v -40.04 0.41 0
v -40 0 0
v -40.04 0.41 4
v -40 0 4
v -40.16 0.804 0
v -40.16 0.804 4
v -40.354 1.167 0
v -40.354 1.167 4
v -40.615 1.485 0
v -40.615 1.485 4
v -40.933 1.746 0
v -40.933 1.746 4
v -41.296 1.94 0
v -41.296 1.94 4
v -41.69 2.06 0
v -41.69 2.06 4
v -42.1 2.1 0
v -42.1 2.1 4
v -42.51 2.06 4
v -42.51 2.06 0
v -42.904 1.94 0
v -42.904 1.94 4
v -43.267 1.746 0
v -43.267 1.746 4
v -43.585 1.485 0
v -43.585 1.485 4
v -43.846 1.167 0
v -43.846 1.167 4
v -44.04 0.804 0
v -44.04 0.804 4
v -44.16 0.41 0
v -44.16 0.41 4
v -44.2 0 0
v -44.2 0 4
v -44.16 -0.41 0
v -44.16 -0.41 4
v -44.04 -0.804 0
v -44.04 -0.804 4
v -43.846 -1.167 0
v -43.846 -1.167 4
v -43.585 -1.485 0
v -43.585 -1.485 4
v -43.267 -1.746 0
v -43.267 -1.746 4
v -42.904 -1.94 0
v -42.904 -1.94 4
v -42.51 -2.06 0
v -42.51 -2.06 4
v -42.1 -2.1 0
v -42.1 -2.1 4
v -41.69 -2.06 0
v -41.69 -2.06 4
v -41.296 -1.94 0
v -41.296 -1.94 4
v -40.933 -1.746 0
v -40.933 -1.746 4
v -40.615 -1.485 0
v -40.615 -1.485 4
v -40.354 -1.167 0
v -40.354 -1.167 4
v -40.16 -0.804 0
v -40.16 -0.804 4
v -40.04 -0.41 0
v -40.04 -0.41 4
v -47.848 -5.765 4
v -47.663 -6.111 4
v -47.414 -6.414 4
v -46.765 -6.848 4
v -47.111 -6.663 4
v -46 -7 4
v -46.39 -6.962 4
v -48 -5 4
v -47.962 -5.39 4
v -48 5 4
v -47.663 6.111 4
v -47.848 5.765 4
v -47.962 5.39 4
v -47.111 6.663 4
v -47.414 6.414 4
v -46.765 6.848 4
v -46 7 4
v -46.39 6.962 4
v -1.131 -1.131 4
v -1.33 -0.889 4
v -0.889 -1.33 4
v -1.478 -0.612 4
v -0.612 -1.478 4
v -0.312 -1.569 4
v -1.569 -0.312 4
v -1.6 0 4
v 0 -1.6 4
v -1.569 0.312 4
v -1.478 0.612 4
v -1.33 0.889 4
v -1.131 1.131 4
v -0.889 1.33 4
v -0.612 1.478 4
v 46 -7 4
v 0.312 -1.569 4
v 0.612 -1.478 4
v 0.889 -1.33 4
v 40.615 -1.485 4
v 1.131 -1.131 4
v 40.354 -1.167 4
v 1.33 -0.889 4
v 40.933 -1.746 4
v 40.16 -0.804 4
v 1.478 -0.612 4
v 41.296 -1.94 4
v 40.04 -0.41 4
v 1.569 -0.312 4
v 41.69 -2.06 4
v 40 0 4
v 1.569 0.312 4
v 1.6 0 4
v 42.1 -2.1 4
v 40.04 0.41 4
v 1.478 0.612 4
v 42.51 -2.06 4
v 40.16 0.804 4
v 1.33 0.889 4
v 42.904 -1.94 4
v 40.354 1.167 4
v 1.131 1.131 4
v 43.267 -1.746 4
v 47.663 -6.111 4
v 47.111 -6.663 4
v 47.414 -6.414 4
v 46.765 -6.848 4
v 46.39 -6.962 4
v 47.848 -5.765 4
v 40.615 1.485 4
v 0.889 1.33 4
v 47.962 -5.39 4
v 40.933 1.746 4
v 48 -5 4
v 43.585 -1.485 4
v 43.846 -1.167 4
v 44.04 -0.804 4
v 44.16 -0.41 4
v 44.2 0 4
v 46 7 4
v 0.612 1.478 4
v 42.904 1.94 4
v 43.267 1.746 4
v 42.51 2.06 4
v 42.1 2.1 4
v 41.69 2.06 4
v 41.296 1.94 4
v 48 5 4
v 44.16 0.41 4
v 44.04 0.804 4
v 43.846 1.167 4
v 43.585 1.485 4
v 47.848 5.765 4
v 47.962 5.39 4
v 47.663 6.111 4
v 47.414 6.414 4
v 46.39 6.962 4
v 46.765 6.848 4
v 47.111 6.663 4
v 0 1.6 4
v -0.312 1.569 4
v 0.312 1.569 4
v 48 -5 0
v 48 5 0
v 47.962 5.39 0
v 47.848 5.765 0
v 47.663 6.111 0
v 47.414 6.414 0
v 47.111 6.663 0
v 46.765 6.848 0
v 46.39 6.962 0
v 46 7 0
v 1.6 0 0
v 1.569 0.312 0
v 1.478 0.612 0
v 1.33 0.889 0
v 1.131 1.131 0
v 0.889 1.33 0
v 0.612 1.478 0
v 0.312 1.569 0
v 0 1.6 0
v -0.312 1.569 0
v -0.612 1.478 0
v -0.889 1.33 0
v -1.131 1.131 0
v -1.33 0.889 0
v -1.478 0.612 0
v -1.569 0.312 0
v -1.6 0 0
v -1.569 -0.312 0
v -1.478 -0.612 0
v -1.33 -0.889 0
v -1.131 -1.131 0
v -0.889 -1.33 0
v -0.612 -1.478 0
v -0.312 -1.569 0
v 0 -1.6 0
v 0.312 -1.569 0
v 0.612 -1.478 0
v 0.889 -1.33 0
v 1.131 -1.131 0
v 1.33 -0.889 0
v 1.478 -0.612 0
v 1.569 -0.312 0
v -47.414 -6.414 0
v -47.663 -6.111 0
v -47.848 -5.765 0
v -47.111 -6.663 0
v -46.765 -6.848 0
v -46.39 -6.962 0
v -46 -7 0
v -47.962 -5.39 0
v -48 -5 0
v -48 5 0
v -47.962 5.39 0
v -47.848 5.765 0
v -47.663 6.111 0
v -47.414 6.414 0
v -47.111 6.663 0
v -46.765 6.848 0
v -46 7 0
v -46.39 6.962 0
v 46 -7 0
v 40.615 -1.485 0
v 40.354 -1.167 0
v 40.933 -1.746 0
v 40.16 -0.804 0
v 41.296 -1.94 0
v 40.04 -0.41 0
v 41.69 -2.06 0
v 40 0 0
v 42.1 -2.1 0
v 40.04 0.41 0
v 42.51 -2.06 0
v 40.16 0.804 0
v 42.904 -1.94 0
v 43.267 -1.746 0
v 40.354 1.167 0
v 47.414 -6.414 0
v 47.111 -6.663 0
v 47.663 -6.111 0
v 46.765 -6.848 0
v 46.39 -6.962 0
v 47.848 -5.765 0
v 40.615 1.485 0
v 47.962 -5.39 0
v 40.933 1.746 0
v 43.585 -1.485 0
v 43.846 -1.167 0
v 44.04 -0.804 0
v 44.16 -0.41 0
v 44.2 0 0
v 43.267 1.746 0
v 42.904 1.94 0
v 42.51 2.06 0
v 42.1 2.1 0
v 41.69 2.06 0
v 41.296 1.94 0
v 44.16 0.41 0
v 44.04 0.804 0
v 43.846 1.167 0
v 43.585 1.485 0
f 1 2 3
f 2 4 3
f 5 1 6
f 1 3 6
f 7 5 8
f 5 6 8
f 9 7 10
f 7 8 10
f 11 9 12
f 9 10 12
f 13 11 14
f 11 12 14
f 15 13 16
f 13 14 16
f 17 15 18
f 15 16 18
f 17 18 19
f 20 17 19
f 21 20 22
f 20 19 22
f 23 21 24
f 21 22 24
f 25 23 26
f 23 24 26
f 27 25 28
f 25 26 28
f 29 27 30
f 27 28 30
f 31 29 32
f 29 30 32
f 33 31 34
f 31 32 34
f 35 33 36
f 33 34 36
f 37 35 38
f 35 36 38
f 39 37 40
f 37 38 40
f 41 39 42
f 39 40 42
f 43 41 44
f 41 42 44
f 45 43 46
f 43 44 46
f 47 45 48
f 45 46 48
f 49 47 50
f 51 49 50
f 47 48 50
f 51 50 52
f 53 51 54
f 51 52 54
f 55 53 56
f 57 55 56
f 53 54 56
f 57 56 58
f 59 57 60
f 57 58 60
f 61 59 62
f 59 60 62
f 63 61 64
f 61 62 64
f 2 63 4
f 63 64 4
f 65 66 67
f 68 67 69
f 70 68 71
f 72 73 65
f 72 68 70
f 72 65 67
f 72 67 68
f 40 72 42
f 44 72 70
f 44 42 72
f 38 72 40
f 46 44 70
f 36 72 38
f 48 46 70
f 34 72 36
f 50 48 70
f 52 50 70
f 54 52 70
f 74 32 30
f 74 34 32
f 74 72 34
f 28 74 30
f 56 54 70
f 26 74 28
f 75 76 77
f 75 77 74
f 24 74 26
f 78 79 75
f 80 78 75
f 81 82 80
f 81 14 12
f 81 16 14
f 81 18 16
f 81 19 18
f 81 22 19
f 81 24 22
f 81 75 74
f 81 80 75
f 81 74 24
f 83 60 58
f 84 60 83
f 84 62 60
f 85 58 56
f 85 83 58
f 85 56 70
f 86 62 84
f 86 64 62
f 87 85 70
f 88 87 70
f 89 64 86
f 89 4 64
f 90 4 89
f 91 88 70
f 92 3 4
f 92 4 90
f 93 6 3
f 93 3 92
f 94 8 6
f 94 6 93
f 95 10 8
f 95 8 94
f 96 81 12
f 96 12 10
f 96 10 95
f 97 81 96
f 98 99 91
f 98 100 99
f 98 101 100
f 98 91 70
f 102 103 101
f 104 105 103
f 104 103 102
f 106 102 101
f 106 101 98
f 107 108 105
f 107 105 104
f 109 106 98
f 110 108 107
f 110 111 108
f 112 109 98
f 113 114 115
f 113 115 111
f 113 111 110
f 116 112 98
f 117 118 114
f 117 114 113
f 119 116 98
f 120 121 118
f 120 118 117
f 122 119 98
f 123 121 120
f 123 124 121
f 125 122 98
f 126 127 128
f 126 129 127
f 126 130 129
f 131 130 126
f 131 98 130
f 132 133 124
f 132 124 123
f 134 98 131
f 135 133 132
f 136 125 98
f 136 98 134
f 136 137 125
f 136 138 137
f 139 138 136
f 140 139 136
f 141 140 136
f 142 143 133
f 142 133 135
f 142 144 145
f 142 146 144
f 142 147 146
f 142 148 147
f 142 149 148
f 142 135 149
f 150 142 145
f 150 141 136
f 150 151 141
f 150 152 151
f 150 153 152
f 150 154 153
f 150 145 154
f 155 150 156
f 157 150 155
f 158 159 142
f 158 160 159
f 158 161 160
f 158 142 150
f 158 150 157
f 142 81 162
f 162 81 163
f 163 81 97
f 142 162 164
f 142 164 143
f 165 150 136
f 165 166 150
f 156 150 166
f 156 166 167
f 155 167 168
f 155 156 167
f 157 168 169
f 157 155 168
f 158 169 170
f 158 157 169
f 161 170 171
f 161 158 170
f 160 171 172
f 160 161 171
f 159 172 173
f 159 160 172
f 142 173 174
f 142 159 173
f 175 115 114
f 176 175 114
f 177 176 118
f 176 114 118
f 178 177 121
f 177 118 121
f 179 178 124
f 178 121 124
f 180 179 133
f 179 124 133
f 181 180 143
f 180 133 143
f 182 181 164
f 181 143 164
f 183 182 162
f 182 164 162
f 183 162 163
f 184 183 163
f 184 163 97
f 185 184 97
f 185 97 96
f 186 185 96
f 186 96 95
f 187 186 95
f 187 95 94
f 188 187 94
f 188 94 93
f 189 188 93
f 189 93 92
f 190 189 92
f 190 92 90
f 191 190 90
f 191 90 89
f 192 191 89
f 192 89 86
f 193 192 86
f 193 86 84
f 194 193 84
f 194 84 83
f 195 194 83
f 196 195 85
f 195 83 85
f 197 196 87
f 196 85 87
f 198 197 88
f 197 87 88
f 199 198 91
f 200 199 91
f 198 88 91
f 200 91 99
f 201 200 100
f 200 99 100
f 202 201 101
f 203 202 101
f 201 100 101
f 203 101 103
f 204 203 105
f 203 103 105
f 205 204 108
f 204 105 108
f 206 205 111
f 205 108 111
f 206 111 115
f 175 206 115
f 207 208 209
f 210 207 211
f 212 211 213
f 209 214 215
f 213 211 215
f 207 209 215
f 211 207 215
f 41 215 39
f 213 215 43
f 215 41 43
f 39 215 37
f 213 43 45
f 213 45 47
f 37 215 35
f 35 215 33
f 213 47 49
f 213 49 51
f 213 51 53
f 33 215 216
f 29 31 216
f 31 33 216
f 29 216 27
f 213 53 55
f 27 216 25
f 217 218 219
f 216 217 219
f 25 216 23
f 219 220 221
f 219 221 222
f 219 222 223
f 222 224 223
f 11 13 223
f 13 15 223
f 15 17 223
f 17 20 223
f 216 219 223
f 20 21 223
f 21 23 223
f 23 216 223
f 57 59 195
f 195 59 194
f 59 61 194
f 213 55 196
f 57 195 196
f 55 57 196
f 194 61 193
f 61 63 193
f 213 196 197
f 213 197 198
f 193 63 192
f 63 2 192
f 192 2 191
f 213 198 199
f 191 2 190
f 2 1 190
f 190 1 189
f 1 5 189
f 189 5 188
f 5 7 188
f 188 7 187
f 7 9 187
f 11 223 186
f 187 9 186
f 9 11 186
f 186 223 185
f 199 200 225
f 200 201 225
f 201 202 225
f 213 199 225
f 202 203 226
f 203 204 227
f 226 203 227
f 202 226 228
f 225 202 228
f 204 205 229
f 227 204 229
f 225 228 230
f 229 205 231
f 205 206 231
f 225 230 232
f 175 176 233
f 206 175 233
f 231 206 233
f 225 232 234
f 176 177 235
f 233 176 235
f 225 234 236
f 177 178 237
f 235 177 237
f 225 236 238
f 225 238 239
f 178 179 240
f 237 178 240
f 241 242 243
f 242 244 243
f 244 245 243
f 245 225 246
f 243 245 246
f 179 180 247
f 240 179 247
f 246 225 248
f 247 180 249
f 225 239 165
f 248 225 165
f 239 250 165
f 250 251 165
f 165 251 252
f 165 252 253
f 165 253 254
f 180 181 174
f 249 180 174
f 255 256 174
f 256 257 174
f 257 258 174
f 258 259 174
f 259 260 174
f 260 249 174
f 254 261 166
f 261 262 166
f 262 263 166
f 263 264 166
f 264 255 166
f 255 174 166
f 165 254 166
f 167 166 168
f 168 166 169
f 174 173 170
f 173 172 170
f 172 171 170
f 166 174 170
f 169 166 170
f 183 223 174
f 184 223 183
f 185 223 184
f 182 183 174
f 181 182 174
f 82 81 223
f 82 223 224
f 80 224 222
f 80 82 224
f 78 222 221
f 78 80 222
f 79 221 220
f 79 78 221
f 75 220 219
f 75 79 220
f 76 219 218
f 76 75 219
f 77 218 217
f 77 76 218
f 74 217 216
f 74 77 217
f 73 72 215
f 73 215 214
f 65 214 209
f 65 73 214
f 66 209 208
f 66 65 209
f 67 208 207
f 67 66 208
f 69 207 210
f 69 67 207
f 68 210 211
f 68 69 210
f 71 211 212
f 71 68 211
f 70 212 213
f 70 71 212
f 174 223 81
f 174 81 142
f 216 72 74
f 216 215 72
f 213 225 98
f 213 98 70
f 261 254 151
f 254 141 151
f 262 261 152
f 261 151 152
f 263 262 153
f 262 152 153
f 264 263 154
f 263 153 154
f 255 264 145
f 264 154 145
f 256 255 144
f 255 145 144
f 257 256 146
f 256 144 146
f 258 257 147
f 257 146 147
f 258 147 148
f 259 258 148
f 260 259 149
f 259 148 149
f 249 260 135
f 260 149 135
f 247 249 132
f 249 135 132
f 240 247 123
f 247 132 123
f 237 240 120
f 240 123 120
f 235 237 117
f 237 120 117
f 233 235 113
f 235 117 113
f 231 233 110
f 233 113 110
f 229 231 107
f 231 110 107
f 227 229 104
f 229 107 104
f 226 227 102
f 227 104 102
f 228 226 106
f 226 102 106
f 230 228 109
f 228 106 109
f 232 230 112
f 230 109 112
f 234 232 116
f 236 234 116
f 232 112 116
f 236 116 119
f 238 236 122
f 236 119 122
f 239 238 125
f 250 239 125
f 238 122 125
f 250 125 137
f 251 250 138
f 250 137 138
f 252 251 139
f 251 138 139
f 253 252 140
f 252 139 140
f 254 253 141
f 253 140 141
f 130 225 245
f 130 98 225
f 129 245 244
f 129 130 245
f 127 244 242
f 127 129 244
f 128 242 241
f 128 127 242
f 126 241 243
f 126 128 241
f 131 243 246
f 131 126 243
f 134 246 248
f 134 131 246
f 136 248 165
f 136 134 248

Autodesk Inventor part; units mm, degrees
ref_plane "YZ Plane" through (0, 0, 0) normal (1, 0, 0) x (0, 1, 0)
ref_plane "XZ Plane" through (0, 0, 0) normal (0, 1, 0) x (-1, 0, 0)
ref_plane "XY Plane" through (0, 0, 0) normal (0, 0, 1) x (1, 0, 0)
sketch "스케치1" plane through (0, 0, 0) normal (0, 0, 1) x (1, 0, 0)
  line L0 (-48, 7) -> (48, 7)
  line L1 (48, 7) -> (48, -7)
  line L2 (48, -7) -> (-48, -7)
  line L3 (-48, -7) -> (-48, 7)
  line L4 (-48, 7) -> (48, -7) construction
  line L5 (48, 7) -> (-48, -7) construction
  point P0 (0, 0)
  dimension "d0" = 96
  dimension "d1" = 14
extrude "돌출1" add sketch "스케치1" along normal blind 4
sketch "스케치2" plane through (0, 0, 4) normal (0, 0, 1) x (1, 0, 0)
  line L0 (-48, -7) -> (48, -7) projected
  line L1 (48, -7) -> (48, 7) projected
  line L2 (48, 7) -> (-48, 7) projected
  line L3 (-48, 7) -> (-48, -7) projected
  circle A0 centre (-42.1, 0) radius 2.1
  circle A1 centre (42.1, 0) radius 2.1
  point P0 (0, 0)
  dimension "d4" = 4.2
  dimension "d5" = 4.2
  dimension "d6" = 84.2
  dimension "d7" = 5.9
  dimension "d10" = 7
extrude "돌출2" cut sketch "스케치2" against normal blind 4 contours A0 | A1
fillet "모깎기1" radius 2 4 edges at (48, 7, 2) (48, -7, 2) (-48, 7, 2) (-48, -7, 2)
sketch "스케치3" plane through (0, 0, 4) normal (0, 0, 1) x (1, 0, 0)
  circle A0 centre (0, 0) radius 1.6
  dimension "d12" = 3.2
extrude "돌출3" cut sketch "스케치3" against normal blind 4
sketch "스케치5" plane through (0, 0, 4) normal (0, 0, 1) x (1, 0, 0)
  circle A0 centre (0, 0) radius 1.6 projected
  arc A1 (-48, -5) -> (-46, -7) centre (-46, -5) ccw projected
  line L0 (-46, -7) -> (46, -7) projected
  arc A2 (46, -7) -> (48, -5) centre (46, -5) ccw projected
  line L1 (48, -5) -> (48, 5) projected
  arc A3 (48, 5) -> (46, 7) centre (46, 5) ccw projected
  line L2 (46, 7) -> (-46, 7) projected
  arc A4 (-46, 7) -> (-48, 5) centre (-46, 5) ccw projected
  line L3 (-48, 5) -> (-48, -5) projected
  circle A5 centre (42.1, 0) radius 2.1 projected
  circle A6 centre (-42.1, 0) radius 2.1 projected
  arc A7 (-46, 7) -> (-48, 5) centre (-46, 5) ccw projected
  line L4 (-48, 5) -> (-48, 20)
  line L5 (-44, 24) -> (44, 24)
  arc A8 (48, 5) -> (46, 7) centre (46, 5) ccw projected
  line L6 (48, 20) -> (48, 5)
  arc A9 (-44, 24) -> (-48, 20) centre (-44, 20) ccw
  arc A10 (48, 20) -> (44, 24) centre (44, 20) ccw
  point P0 (-48, 24)
  point P1 (48, 24)
  dimension "d18" = 19
  dimension "d21" = 4
sketch "스케치6" plane through (0, 0, 4) normal (0, 0, 1) x (1, 0, 0)
  circle A0 centre (0, 0) radius 1.6 projected
  arc A1 (-48, -5) -> (-46, -7) centre (-46, -5) ccw projected
  line L0 (-46, -7) -> (46, -7) projected
  arc A2 (46, -7) -> (48, -5) centre (46, -5) ccw projected
  line L1 (48, -5) -> (48, 20) projected
  arc A3 (48, 20) -> (44, 24) centre (44, 20) ccw projected
  line L2 (44, 24) -> (-44, 24) projected
  arc A4 (-44, 24) -> (-48, 20) centre (-44, 20) ccw projected
  line L3 (-48, 20) -> (-48, -5) projected
  circle A5 centre (42.1, 0) radius 2.1 projected
  circle A6 centre (-42.1, 0) radius 2.1 projected
  line L4 (48, -5) -> (48, 20) projected
  line L5 (-48, 23.602) -> (48, 23.602)
  line L6 (48, 23.602) -> (48, 18)
  line L7 (48, 18) -> (-48, 18)
  line L8 (-48, 18) -> (-48, 23.602)
  circle A7 centre (0, 20.4) radius 1.6
  circle A8 centre (-42.1, 20.4) radius 1.6
  circle A9 centre (42.1, 20.4) radius 1.6
  dimension "d23" = 3.2
  dimension "d24" = 3.2
  dimension "d35" = 3.6
sketch "스케치8" plane through (0, 0, 0) normal (0, 0, -1) x (-1, 0, 0)
  circle A0 centre (-42.1, 20.4) radius 1.6 projected
  circle A1 centre (0, 20.4) radius 1.6 projected
  circle A2 centre (42.1, 20.4) radius 1.6 projected
  circle A3 centre (0, 0) radius 1.6 projected
  circle A4 centre (-42.1, 0) radius 2.1 projected
  circle A5 centre (42.1, 0) radius 2.1 projected
  arc A6 (46, -7) -> (48, -5) centre (46, -5) ccw projected
  line L0 (48, 20) -> (48, -5) projected
  arc A7 (48, 20) -> (44, 24) centre (44, 20) ccw projected
  line L1 (44, 24) -> (-44, 24) projected
  arc A8 (-44, 24) -> (-48, 20) centre (-44, 20) ccw projected
  line L2 (-48, 20) -> (-48, -5) projected
  arc A9 (-48, -5) -> (-46, -7) centre (-46, -5) ccw projected
  line L3 (46, -7) -> (-46, -7) projected
  line L4 (-48, 24) -> (-18, 24)
  line L5 (-18, 24) -> (-18, 9)
  line L6 (-18, 9) -> (-48, 9)
  line L7 (-48, 9) -> (-48, 24)
  point P0 (-44, 24)
  dimension "d27" = 30
  dimension "d28" = 15
sketch "스케치10" plane through (0, 0, 0) normal (0, 0, -1) x (-1, 0, 0)
  arc A0 (-45, 9) -> (-48, 6) centre (-45, 6) ccw projected
  line L0 (-48, 6) -> (-48, -5) projected
  arc A1 (-48, -5) -> (-46, -7) centre (-46, -5) ccw projected
  line L1 (46, -7) -> (-46, -7) projected
  arc A2 (46, -7) -> (48, -5) centre (46, -5) ccw projected
  line L2 (48, 20) -> (48, -5) projected
  arc A3 (48, 20) -> (44, 24) centre (44, 20) ccw projected
  line L3 (44, 24) -> (-15, 24) projected
  arc A4 (-15, 24) -> (-18, 21) centre (-15, 21) ccw projected
  line L4 (-18, 21) -> (-18, 12) projected
  arc A5 (-21, 9) -> (-18, 12) centre (-21, 12) ccw projected
  line L5 (-21, 9) -> (-45, 9) projected
  circle A6 centre (42.1, 0) radius 2.1 projected
  circle A7 centre (-42.1, 0) radius 2.1 projected
  circle A8 centre (0, 0) radius 1.6 projected
  circle A9 centre (42.1, 20.4) radius 1.6 projected
  circle A10 centre (0, 20.4) radius 1.6 projected
  circle A11 centre (21.05, 20.4) radius 1.6
  dimension "d32" = 21.05
properties part number "축지지프레임" material "알루미늄 6061"
